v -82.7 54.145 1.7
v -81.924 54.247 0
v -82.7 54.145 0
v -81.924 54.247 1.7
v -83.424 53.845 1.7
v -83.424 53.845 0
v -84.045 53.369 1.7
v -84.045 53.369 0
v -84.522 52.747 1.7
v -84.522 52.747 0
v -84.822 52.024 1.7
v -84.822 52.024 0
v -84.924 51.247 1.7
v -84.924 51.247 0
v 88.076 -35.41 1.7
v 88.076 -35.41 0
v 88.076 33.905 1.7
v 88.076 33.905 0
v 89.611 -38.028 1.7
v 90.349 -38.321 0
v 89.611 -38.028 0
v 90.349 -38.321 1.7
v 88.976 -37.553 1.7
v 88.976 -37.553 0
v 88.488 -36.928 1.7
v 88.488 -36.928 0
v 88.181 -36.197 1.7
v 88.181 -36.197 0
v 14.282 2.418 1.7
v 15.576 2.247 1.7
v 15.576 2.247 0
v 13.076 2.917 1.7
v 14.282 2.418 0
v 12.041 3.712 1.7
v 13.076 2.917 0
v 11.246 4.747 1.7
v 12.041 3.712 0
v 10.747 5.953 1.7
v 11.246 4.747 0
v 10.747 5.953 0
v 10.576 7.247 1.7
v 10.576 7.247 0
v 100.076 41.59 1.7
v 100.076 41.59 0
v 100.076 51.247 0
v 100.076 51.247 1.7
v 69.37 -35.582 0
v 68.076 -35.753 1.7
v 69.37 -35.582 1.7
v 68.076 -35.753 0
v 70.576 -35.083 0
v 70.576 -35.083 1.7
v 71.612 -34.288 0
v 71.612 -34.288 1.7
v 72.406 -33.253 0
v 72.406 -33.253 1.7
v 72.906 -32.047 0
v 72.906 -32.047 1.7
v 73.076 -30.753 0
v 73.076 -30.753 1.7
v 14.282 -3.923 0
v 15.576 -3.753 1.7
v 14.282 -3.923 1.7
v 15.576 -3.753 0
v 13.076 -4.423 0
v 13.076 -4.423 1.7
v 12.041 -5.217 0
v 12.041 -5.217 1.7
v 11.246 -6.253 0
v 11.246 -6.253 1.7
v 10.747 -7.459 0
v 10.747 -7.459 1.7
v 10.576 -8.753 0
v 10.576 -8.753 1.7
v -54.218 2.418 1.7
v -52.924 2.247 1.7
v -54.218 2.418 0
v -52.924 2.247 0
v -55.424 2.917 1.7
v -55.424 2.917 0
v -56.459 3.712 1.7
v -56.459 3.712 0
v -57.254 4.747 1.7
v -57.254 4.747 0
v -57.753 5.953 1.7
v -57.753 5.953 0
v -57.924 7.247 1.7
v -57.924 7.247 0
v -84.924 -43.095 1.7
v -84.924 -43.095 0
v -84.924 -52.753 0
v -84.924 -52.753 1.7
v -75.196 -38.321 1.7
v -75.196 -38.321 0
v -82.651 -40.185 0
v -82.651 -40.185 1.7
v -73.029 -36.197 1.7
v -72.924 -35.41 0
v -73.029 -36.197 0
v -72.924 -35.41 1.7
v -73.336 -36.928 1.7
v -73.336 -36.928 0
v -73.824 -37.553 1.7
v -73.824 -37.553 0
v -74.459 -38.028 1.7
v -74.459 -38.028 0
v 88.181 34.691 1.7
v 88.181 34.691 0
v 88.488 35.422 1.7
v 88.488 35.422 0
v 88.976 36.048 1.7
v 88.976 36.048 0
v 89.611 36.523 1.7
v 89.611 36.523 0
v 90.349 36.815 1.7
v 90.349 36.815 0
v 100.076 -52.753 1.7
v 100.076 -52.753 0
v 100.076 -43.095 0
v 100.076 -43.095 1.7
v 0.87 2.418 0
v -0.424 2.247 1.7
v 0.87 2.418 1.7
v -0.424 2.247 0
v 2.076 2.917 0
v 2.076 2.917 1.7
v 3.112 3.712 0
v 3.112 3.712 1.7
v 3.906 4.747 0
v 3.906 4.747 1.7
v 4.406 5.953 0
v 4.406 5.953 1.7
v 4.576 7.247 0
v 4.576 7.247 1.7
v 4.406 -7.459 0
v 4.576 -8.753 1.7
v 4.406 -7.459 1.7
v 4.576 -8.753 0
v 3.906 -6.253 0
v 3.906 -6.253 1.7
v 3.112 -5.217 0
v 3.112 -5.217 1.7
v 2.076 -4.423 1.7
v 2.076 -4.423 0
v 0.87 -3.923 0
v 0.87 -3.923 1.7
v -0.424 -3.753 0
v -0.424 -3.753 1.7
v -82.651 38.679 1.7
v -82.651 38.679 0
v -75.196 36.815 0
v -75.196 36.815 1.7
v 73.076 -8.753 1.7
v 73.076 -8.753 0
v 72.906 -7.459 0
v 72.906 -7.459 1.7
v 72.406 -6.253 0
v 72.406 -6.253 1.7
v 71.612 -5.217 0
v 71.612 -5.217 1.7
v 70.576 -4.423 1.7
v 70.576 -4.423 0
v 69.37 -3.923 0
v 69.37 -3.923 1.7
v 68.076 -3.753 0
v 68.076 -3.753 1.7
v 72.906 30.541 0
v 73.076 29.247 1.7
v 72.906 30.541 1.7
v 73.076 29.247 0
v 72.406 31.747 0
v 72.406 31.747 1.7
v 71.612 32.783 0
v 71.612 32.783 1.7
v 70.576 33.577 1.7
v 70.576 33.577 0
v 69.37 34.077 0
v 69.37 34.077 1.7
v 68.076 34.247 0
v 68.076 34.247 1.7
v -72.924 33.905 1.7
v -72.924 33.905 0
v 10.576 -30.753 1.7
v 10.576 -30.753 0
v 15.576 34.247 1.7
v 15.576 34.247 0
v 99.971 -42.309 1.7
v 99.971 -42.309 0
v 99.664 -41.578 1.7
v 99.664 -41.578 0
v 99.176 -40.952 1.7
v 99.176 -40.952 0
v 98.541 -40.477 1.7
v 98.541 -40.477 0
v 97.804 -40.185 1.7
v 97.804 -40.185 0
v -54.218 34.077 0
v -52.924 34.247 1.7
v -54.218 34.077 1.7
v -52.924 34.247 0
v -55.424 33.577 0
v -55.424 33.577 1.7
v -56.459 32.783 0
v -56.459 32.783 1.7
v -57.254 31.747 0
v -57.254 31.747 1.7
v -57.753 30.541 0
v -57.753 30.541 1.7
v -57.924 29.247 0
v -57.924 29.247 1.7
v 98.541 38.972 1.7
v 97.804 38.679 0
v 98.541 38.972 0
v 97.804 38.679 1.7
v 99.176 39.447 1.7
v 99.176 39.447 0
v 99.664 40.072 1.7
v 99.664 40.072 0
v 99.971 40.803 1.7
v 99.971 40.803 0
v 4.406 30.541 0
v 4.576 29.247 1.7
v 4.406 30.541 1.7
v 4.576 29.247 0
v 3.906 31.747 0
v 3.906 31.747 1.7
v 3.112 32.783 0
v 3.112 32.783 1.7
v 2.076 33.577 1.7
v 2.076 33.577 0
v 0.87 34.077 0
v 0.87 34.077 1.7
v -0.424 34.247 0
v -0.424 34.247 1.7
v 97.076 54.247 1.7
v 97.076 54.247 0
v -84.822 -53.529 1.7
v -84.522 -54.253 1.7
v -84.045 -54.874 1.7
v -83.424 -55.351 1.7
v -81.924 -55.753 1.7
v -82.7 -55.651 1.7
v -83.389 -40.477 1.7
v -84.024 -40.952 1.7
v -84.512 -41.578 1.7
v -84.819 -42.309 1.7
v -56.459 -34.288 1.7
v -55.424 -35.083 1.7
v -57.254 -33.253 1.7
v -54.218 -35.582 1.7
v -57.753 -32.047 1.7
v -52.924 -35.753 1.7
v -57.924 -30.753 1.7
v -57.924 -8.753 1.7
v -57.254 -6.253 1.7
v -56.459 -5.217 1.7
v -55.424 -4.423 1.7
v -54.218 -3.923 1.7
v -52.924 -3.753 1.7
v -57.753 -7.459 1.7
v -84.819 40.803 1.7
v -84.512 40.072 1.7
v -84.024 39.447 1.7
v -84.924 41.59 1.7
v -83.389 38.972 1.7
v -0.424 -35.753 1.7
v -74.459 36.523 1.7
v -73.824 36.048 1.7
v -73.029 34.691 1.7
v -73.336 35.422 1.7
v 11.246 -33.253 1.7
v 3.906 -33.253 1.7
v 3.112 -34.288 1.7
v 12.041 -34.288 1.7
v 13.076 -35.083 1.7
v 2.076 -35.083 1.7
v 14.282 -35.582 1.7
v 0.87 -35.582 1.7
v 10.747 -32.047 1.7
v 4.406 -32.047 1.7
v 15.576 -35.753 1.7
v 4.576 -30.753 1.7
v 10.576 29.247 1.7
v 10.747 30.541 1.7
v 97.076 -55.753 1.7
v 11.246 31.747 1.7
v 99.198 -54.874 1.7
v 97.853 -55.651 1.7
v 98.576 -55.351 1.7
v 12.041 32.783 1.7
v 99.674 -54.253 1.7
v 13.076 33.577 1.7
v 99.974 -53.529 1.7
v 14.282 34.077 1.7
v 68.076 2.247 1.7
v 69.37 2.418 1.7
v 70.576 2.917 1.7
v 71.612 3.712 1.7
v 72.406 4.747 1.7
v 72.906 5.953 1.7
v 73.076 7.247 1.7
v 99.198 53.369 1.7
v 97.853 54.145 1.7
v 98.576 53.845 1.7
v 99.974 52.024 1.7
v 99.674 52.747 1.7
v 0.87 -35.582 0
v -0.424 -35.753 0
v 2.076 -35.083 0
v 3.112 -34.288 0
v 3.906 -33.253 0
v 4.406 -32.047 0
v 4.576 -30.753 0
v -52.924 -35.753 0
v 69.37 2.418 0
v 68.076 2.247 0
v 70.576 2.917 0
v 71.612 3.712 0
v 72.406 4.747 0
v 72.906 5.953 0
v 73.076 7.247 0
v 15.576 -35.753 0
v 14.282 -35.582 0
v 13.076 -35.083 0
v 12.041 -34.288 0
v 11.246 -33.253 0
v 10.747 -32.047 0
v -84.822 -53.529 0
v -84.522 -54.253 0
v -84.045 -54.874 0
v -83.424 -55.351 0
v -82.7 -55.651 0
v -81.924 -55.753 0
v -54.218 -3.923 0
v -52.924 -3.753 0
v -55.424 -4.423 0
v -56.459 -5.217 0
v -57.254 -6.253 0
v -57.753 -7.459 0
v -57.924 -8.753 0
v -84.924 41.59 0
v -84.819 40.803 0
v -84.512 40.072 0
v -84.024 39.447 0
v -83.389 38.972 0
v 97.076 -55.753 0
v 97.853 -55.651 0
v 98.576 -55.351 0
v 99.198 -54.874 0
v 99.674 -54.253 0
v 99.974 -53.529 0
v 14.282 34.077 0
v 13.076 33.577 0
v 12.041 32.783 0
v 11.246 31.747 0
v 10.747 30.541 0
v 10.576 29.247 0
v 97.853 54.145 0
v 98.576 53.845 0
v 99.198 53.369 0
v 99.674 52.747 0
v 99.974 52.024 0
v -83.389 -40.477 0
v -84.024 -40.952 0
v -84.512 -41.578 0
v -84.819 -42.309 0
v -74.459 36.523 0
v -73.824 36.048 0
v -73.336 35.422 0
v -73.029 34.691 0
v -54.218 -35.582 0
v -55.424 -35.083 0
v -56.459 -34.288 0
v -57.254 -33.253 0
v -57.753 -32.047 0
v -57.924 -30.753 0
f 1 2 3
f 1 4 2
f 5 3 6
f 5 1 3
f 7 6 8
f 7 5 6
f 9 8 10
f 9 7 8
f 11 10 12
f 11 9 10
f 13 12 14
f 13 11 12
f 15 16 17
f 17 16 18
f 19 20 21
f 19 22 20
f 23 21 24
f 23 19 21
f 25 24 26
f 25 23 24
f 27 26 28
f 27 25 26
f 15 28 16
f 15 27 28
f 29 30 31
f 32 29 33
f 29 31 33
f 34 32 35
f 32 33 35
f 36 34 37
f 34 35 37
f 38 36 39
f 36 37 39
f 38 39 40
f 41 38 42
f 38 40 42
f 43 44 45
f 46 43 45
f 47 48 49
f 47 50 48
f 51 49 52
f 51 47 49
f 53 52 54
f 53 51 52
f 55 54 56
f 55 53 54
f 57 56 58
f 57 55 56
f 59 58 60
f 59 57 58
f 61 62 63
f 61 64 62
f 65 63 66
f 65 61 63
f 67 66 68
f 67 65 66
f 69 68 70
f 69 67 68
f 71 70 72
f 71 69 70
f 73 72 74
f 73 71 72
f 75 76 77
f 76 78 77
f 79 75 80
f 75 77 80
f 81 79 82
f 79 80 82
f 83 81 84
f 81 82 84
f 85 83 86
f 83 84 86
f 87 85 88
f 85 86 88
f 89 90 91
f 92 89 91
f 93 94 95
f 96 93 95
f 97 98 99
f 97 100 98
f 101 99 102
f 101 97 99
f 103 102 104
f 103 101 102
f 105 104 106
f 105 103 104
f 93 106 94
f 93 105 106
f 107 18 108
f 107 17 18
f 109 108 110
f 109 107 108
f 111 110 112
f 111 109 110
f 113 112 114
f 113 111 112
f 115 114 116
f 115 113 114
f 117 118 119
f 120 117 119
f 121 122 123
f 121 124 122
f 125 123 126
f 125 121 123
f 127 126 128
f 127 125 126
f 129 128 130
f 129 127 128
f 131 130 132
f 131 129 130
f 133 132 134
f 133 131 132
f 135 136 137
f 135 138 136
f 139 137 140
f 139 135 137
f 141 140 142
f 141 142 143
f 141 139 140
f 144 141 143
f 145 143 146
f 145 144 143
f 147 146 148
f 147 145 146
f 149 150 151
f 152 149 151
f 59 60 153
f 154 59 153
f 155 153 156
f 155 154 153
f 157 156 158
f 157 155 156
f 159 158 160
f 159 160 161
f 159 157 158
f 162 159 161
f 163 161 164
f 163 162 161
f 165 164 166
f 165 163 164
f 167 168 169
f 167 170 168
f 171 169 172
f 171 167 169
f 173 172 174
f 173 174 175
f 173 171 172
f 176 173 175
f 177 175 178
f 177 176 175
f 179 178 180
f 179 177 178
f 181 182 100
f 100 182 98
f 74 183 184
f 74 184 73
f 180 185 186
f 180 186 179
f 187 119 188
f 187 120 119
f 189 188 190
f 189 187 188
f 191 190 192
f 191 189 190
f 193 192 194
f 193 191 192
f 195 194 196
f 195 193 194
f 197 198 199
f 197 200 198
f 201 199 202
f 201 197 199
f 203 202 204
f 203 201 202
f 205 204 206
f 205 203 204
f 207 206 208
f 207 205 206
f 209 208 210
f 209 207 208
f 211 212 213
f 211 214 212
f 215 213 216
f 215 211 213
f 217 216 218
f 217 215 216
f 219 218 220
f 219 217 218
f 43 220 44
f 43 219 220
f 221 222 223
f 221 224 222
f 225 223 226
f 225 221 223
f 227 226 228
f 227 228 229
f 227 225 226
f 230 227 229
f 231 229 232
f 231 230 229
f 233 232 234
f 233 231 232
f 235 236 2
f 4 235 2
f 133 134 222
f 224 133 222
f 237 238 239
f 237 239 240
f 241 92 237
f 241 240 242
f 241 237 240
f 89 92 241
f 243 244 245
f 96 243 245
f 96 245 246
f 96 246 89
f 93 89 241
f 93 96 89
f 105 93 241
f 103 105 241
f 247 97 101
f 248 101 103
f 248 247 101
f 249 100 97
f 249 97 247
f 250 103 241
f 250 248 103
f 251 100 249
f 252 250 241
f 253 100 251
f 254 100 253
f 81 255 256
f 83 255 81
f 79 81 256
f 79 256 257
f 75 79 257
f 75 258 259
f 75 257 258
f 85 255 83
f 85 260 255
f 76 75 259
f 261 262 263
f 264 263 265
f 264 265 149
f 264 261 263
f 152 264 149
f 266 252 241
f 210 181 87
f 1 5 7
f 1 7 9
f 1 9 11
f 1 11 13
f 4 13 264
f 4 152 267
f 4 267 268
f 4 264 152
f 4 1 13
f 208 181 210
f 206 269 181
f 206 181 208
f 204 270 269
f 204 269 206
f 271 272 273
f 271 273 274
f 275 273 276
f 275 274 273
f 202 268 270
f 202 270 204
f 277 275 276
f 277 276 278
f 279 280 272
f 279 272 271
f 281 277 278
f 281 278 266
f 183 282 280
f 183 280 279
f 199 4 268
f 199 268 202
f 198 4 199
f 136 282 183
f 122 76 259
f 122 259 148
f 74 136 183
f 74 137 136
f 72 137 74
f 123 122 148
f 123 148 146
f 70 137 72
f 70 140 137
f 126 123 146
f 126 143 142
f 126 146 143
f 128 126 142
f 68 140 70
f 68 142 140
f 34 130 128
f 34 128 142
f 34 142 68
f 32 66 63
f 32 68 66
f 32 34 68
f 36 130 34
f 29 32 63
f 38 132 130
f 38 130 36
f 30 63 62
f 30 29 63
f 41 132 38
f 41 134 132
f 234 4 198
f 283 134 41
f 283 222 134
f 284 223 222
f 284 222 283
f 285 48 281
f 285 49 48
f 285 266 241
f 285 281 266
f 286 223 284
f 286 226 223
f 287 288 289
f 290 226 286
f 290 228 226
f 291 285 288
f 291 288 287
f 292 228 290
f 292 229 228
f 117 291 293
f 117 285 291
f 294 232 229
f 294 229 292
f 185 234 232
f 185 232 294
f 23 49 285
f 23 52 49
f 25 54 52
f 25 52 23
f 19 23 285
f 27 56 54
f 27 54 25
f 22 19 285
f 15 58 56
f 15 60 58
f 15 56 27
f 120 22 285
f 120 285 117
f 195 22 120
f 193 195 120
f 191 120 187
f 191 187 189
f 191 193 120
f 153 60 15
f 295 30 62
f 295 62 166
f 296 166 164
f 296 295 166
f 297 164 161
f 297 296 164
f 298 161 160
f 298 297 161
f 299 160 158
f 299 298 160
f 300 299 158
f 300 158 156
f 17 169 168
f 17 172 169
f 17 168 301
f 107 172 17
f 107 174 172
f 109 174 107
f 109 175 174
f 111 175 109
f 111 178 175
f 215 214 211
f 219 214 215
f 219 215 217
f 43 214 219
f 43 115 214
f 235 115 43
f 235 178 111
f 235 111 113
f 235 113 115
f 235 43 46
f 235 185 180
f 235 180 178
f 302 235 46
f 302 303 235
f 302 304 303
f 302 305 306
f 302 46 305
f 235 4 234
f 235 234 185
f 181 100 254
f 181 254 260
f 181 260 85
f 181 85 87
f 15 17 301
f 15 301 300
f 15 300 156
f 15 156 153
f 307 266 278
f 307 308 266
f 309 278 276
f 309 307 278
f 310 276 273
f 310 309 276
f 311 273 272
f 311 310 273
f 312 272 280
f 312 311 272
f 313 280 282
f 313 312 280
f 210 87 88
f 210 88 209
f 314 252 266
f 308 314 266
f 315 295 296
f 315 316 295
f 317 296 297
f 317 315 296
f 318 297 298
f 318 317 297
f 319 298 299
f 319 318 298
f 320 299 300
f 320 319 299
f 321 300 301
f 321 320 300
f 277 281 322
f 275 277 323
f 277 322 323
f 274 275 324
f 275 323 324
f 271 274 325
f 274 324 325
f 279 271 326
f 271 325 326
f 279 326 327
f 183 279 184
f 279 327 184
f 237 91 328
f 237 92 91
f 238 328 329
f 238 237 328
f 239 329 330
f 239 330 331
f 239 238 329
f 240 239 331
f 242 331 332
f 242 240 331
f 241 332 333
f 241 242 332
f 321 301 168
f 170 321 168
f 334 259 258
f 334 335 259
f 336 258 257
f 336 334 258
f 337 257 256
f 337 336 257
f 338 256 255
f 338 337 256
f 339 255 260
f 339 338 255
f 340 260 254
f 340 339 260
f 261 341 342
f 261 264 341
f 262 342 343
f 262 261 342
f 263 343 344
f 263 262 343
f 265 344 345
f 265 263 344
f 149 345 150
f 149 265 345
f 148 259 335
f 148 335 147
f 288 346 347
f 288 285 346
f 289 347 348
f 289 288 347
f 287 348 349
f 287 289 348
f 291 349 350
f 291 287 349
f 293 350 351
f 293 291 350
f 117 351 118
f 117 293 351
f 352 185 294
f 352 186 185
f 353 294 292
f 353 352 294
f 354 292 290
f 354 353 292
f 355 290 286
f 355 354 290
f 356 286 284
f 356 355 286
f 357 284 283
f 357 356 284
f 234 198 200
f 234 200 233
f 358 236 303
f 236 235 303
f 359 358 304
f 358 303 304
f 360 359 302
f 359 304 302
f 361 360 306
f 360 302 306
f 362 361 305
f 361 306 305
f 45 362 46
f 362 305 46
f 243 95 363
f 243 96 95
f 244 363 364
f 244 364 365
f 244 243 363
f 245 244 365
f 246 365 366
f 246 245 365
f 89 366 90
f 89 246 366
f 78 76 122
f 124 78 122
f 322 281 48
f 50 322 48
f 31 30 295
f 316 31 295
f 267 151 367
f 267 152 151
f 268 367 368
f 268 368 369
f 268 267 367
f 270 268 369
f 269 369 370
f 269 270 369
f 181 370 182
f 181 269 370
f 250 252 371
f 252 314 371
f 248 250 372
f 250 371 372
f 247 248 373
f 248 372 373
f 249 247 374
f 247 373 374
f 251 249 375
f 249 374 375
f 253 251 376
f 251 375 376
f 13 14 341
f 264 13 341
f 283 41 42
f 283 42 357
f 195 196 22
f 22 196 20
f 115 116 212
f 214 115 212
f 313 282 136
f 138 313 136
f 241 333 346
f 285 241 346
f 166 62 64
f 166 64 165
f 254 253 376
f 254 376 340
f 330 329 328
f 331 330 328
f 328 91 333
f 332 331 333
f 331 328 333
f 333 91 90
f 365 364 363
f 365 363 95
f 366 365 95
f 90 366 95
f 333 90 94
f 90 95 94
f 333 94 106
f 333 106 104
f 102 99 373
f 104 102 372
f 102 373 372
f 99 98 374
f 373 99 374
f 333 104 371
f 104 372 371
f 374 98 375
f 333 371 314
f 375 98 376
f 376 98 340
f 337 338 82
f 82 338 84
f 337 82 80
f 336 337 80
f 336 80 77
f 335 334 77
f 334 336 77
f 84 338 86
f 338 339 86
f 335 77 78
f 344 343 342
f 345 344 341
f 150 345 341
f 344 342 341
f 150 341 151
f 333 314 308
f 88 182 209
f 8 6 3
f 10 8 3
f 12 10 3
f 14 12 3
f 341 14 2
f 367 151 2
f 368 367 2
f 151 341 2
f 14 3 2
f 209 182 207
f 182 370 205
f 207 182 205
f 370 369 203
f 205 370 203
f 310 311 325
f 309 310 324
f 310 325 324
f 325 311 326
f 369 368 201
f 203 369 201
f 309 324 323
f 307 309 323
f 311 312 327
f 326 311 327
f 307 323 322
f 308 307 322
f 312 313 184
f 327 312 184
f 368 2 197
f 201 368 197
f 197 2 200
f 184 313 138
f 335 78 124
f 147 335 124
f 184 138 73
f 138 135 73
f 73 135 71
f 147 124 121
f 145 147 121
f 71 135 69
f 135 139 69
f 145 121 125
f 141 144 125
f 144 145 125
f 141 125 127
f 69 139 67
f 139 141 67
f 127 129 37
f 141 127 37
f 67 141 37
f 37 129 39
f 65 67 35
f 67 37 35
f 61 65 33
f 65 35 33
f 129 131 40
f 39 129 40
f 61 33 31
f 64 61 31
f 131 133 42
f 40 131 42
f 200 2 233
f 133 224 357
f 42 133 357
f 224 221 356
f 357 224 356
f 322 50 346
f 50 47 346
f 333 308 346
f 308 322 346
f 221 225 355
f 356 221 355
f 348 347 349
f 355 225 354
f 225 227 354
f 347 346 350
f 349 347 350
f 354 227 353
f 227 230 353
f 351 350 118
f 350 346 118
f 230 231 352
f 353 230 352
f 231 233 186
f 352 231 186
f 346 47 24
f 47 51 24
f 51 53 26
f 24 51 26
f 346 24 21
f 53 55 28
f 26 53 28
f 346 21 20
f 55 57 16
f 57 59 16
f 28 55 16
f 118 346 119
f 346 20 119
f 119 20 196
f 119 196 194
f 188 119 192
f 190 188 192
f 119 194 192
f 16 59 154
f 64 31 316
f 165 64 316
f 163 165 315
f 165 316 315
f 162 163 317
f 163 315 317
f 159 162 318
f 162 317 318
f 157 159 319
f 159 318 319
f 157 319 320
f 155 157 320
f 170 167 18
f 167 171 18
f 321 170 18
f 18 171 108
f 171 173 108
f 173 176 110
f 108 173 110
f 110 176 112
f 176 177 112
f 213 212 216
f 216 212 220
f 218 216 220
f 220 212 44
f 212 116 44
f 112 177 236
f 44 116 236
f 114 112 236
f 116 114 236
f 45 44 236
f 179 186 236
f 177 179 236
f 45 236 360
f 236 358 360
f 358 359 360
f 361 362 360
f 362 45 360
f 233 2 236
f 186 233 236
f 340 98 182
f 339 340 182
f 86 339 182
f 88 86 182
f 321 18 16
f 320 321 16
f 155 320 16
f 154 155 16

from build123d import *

# Parameters (mm, degrees)
F1_DEPTH = 1.7
F2_R     = 3
F3_W     = 62.5
F3_H     = 32
F4_DEPTH = 1.701
F5_R     = 5


with BuildPart() as f1:
    # F0 (on Top) → F1 (new body)
    with BuildSketch(Plane.XY):
        Polygon((100.0762677759, 54.24722471), (-84.9237322241, 54.24722471), (-84.9237322241, 39.24722471), (-72.9237322241, 39.24722471), (-72.9237322241, 36.24722471), (-72.9237322241, -37.75277529), (-72.9237322241, -40.75277529), (-84.9237322241, -40.75277529), (-84.9237322241, -55.75277529), (100.0762677759, -55.75277529), (100.0762677759, -40.75277529), (88.0762677759, -37.75277529), (88.0762677759, 36.24722471), (88.0762677759, 39.24722471), (100.0762677759, 39.24722471), align=None)
        Polygon((88.0762677759, 36.24722471), (100.0762677759, 39.24722471), (88.0762677759, 39.24722471), align=None)
        Polygon((-72.9237322241, 39.24722471), (-84.9237322241, 39.24722471), (-72.9237322241, 36.24722471), align=None)
        Polygon((-72.9237322241, -40.75277529), (-72.9237322241, -37.75277529), (-84.9237322241, -40.75277529), align=None)
    extrude(amount=F1_DEPTH)

    # F2
    f2_edges = [f1.edges().sort_by_distance(p)[0] for p in [
        (-72.923732, -37.752775, 0.85),
        (-72.923732, 36.247225, 0.85),
        (-84.923732, 39.247225, 0.85),
        (-84.923732, -40.752775, 0.85),
        (88.076268, 36.247225, 0.85),
        (100.076268, 39.247225, 0.85),
        (-84.923732, -55.752775, 0.85),
        (-84.923732, 54.247225, 0.85),
        (100.076268, 54.247225, 0.85),
        (100.076268, -55.752775, 0.85),
        (100.076268, -40.752775, 0.85),
        (88.076268, -37.752775, 0.85),
    ]]
    fillet(f2_edges, radius=F2_R)

    # F3 (on face) → F4 (cut, through all)
    with BuildSketch(Plane.XY.offset(1.7)):
        with Locations((-26.6737322241, 18.24722471)):
            Rectangle(F3_W, F3_H)
        with Locations((-26.6737322241, -19.75277529)):
            Rectangle(F3_W, F3_H)
        with Locations((41.8262677759, 18.24722471)):
            Rectangle(F3_W, F3_H)
        with Locations((41.8262677759, -19.75277529)):
            Rectangle(F3_W, F3_H)
    extrude(amount=-F4_DEPTH, mode=Mode.SUBTRACT)

    # F5
    f5_edges = [f1.edges().sort_by_distance(p)[0] for p in [
        (-57.923732, 34.247225, 0.85),
        (4.576268, 2.247225, 0.85),
        (73.076268, -35.752775, 0.85),
        (10.576268, -35.752775, 0.85),
        (10.576268, 2.247225, 0.85),
        (10.576268, -3.752775, 0.85),
        (10.576268, 34.247225, 0.85),
        (-57.923732, -3.752775, 0.85),
        (4.576268, -3.752775, 0.85),
        (73.076268, -3.752775, 0.85),
        (4.576268, -35.752775, 0.85),
        (-57.923732, -35.752775, 0.85),
        (4.576268, 34.247225, 0.85),
        (-57.923732, 2.247225, 0.85),
        (73.076268, 34.247225, 0.85),
        (73.076268, 2.247225, 0.85),
    ]]
    fillet(f5_edges, radius=F5_R)


solid = f1.part
